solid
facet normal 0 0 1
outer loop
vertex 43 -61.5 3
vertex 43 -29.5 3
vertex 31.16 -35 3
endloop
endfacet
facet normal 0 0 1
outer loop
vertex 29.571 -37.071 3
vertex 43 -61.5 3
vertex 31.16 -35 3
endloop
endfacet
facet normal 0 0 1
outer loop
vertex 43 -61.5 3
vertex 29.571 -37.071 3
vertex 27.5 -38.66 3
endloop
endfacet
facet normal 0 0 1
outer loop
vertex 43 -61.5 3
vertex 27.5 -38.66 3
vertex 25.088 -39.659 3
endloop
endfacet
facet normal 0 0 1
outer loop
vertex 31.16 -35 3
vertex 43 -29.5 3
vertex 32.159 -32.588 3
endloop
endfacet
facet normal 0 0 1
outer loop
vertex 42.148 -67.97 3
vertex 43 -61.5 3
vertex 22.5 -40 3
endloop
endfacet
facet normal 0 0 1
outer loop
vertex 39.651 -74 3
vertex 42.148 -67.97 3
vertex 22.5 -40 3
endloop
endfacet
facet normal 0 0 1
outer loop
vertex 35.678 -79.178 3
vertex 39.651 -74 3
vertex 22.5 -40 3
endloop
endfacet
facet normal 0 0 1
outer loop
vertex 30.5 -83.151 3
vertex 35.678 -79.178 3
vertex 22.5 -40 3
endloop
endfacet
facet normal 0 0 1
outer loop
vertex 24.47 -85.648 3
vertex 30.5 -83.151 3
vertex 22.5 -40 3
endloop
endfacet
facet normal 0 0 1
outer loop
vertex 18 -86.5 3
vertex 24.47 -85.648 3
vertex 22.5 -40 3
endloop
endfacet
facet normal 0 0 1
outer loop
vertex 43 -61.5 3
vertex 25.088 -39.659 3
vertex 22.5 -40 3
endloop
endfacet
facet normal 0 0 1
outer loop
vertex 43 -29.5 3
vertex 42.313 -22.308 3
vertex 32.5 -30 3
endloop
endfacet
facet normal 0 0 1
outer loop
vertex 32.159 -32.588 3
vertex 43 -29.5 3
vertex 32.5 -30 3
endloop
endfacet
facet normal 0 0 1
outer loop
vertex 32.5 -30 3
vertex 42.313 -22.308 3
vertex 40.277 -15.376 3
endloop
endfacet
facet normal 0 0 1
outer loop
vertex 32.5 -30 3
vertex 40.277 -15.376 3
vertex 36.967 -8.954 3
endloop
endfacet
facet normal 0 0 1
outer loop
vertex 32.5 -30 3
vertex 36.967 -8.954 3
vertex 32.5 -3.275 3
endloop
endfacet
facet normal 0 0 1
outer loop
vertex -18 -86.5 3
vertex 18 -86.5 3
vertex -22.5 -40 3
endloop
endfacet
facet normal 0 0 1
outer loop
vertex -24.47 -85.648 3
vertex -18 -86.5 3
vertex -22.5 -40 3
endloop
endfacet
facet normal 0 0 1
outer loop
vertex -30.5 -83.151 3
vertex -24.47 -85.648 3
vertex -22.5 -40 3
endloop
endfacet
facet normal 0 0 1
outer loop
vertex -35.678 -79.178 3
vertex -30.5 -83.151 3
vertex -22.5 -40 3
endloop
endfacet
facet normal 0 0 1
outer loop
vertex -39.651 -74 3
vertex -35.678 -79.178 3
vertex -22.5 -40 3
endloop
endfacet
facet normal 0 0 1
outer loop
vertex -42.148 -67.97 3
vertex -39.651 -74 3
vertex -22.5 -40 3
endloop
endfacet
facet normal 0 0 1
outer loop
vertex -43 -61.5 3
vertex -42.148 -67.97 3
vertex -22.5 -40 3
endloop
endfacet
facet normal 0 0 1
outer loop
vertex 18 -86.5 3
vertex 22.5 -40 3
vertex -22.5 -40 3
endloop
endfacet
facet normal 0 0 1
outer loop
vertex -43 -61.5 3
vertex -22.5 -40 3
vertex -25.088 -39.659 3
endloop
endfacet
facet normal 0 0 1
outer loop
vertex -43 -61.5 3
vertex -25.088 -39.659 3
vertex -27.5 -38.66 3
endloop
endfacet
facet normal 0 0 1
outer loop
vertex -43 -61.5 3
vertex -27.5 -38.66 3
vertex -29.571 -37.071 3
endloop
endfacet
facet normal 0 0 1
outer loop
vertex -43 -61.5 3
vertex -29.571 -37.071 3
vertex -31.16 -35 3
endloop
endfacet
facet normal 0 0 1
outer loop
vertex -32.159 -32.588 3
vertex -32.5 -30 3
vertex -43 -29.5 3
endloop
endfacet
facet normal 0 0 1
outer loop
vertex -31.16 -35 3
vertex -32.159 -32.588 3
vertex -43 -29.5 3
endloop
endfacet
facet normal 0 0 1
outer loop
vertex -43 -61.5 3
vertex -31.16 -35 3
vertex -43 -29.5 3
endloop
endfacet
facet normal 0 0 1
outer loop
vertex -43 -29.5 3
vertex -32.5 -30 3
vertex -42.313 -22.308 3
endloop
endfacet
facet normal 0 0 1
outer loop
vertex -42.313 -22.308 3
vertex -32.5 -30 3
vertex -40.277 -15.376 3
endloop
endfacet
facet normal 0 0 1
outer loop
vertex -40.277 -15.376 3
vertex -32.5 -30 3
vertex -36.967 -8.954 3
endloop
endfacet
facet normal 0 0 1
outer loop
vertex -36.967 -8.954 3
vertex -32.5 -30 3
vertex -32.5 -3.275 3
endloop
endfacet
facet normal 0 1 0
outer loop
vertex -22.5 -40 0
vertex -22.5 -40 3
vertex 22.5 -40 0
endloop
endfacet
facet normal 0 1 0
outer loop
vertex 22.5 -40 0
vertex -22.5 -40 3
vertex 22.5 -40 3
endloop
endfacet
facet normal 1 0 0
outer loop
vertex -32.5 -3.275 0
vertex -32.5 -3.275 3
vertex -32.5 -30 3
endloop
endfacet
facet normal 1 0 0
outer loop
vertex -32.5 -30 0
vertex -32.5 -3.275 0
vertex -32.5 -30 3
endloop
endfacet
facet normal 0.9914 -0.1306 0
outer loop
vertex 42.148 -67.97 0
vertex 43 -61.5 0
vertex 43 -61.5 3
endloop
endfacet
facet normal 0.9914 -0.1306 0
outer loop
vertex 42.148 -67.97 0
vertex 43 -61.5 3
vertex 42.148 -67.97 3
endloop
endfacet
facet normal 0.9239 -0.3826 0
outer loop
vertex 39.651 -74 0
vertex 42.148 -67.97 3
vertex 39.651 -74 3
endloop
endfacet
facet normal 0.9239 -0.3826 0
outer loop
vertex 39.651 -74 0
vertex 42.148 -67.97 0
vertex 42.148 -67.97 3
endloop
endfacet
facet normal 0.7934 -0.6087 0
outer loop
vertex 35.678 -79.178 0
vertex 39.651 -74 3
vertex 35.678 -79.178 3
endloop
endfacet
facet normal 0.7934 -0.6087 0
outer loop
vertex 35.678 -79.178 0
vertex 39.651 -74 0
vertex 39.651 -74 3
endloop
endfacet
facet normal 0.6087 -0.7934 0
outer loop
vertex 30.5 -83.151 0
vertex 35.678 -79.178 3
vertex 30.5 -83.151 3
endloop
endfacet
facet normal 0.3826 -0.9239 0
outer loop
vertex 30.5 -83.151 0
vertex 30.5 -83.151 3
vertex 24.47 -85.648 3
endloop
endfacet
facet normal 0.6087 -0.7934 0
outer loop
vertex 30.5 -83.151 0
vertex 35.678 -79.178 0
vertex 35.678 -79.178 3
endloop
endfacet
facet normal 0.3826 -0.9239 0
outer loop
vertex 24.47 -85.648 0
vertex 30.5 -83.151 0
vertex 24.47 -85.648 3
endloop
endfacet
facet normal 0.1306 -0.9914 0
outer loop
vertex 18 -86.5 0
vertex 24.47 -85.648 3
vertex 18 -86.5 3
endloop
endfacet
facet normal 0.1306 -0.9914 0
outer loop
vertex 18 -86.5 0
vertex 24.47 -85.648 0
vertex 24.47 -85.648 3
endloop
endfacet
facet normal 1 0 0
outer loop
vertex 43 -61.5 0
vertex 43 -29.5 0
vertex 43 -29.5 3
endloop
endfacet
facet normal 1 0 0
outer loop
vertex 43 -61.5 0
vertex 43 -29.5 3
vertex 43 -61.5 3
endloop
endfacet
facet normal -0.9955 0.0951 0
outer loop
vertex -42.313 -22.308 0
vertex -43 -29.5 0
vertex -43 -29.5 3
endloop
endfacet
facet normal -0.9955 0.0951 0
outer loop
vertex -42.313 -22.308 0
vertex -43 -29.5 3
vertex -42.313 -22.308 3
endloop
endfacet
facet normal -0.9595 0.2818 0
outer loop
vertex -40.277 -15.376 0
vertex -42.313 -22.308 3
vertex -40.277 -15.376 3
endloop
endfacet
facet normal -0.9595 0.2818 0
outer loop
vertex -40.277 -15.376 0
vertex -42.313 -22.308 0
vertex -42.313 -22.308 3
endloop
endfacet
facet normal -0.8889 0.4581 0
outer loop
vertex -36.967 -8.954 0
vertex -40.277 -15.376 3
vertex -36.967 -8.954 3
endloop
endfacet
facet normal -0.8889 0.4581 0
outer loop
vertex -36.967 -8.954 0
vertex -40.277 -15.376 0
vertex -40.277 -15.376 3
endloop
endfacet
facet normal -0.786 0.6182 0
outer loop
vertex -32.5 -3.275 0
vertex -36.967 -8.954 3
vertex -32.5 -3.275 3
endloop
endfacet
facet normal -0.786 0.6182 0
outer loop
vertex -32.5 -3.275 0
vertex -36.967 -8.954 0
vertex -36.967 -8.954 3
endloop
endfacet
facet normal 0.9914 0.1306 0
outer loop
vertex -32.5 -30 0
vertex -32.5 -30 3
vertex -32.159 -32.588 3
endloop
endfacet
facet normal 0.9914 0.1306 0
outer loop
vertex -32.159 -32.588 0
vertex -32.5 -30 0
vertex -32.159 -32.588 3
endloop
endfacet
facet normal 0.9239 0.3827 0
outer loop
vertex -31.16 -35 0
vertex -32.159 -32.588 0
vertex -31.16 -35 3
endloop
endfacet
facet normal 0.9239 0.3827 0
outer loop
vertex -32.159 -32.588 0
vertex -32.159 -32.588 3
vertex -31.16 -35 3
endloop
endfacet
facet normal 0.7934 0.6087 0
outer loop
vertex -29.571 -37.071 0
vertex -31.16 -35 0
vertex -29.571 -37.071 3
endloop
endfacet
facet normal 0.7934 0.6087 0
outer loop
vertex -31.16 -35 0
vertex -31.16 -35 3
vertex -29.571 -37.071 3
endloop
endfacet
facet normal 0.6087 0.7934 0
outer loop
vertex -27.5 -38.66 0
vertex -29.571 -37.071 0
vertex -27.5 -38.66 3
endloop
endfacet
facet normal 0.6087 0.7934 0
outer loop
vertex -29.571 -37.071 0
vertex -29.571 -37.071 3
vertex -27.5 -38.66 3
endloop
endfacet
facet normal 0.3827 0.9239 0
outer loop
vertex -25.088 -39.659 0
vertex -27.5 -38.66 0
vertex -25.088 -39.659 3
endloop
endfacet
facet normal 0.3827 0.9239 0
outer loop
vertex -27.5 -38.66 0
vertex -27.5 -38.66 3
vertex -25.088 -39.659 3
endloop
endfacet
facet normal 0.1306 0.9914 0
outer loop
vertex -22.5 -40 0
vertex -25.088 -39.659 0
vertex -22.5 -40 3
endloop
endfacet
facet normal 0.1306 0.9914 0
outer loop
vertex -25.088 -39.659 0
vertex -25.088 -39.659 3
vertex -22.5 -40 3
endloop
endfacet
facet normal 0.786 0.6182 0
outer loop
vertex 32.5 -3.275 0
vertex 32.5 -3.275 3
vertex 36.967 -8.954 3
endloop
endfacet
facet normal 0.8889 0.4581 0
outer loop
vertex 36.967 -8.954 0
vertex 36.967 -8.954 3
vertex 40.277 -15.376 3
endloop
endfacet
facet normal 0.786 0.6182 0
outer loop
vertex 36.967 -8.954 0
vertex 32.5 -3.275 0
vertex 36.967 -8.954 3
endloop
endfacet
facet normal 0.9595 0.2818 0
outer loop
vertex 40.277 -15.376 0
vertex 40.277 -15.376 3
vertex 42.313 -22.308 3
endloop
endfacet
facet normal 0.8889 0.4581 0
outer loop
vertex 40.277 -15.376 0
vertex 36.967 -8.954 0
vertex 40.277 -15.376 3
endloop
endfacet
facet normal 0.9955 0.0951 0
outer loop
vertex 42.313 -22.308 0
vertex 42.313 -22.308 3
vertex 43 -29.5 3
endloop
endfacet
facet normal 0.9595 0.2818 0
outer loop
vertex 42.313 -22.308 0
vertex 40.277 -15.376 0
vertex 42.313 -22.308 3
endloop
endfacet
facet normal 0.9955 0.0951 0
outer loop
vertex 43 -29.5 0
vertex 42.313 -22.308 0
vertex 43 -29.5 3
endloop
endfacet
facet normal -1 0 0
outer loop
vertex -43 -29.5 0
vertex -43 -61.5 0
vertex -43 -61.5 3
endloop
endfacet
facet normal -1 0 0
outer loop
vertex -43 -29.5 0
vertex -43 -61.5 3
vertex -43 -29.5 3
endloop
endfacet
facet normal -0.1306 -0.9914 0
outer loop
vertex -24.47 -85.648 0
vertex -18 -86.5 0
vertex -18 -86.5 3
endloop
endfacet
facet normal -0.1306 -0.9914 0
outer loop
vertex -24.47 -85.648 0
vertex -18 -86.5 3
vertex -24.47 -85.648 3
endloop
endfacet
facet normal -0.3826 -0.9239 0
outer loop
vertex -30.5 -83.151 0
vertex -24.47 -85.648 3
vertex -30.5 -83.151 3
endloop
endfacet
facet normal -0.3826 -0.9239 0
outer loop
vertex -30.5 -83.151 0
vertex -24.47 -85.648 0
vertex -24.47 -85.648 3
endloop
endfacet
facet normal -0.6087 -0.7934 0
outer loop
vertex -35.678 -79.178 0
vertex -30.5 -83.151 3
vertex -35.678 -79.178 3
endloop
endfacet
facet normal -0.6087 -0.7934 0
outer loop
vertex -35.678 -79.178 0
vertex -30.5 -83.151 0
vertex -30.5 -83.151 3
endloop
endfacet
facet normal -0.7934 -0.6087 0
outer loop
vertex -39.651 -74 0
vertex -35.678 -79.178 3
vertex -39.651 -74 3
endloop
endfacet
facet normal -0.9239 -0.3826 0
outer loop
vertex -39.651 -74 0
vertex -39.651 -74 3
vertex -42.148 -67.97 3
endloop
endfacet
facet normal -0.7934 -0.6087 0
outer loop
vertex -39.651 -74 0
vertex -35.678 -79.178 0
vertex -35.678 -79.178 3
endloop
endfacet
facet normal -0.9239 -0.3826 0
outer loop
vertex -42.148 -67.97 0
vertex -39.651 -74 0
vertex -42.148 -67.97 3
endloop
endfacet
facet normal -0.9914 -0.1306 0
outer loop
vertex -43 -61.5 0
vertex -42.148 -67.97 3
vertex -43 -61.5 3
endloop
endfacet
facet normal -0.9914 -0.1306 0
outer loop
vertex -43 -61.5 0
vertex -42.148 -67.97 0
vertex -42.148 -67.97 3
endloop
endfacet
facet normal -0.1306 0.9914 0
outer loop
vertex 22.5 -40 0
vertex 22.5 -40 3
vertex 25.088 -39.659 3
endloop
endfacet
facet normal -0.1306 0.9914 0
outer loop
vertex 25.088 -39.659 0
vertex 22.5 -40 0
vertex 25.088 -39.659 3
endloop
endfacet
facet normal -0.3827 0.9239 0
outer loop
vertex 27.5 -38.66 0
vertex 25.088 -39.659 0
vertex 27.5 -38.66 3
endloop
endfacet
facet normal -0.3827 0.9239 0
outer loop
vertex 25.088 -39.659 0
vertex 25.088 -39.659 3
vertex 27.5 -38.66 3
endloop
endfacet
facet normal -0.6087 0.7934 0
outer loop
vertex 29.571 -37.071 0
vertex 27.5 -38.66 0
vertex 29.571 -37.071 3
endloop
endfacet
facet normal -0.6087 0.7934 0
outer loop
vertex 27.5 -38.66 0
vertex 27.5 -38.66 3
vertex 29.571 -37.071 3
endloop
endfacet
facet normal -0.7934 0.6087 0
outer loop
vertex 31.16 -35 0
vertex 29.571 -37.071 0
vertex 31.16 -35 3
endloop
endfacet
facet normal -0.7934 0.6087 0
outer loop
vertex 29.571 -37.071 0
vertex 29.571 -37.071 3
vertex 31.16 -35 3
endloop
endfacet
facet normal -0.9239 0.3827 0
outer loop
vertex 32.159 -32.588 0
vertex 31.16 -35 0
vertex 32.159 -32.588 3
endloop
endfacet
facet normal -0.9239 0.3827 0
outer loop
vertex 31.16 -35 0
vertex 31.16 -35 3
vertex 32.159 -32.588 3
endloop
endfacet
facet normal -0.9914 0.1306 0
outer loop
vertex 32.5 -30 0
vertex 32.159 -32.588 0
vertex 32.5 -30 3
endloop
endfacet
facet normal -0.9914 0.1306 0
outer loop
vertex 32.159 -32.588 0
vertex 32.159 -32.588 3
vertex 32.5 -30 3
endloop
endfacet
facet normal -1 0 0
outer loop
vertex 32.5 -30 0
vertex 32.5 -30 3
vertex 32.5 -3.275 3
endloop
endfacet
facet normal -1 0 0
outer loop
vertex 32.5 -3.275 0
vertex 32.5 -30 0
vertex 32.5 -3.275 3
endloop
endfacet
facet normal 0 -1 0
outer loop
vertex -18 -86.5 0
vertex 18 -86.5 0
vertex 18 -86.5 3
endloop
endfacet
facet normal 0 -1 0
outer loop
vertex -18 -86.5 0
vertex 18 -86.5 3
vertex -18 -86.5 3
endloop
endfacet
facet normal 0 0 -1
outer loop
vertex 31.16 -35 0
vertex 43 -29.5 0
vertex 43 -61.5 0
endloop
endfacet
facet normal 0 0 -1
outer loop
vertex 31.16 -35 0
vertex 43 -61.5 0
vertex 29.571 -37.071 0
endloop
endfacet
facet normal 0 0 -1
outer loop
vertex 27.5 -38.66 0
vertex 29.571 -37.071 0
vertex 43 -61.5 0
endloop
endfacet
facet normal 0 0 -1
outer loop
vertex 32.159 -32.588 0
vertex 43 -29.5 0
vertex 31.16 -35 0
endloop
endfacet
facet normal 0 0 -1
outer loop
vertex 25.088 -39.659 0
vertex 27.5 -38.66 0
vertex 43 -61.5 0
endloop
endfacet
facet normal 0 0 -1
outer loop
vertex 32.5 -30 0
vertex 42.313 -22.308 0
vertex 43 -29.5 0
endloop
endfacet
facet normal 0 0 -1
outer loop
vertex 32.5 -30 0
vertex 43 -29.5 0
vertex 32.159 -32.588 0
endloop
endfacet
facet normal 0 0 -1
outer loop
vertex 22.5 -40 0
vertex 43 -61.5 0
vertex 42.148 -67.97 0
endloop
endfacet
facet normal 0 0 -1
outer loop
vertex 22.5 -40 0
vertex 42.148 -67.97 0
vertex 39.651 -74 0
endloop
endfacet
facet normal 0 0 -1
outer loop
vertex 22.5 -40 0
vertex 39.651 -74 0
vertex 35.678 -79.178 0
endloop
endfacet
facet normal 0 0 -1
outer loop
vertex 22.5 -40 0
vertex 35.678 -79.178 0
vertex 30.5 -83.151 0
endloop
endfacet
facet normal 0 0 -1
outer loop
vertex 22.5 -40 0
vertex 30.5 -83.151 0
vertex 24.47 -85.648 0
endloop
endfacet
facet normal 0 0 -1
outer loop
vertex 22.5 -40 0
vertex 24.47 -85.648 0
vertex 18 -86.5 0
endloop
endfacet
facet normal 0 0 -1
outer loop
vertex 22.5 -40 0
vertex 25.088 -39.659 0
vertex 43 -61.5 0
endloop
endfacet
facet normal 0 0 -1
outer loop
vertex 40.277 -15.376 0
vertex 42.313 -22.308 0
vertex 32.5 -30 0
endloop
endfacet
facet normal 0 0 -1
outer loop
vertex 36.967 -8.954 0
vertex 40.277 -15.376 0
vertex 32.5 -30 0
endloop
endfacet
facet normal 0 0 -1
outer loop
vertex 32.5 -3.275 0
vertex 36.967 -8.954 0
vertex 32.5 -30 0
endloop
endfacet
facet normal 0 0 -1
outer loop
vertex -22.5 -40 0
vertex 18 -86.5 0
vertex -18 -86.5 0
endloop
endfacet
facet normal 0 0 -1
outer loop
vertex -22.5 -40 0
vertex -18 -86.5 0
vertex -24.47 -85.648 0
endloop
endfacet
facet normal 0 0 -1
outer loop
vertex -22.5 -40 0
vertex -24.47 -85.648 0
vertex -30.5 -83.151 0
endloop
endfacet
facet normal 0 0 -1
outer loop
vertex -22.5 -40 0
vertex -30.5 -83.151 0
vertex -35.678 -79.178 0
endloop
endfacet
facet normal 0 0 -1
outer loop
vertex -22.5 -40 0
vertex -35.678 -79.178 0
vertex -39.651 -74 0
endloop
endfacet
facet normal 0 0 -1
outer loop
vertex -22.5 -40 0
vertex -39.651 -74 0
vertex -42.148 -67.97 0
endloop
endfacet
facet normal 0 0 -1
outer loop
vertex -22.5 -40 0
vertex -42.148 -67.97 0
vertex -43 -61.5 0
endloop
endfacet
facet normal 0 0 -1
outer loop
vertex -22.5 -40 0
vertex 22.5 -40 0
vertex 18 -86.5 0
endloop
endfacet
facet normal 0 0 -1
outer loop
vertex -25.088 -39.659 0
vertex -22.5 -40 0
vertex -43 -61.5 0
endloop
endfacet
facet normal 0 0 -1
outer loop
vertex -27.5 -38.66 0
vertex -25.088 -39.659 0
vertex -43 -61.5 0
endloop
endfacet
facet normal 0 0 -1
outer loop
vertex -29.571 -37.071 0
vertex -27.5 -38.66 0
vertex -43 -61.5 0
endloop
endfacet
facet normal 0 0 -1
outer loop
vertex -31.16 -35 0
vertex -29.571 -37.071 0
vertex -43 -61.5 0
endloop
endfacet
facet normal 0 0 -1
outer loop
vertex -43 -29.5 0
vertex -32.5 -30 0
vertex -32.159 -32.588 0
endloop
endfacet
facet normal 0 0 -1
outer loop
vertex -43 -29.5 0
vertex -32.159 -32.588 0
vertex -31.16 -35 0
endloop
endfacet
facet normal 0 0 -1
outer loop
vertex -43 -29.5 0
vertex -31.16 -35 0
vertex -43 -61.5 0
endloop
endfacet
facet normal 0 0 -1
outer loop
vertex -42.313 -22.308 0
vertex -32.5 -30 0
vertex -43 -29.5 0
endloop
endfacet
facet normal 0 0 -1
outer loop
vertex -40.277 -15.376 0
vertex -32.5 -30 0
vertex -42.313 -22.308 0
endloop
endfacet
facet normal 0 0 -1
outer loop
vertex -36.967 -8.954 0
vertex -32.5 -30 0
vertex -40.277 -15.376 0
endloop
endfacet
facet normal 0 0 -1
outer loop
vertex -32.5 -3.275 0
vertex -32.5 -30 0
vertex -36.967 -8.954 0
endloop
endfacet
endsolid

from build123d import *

# Parameters (mm, degrees)
BOSS_EXTRUDE1_DEPTH = 3
CUT_EXTRUDE1_DEPTH  = 10


with BuildPart() as part:
    # Sketch1 → Boss-Extrude1 (new body)
    with BuildSketch(Plane.XY):
        with BuildLine():
            Line((-5, 8.5), (5, 8.5))
            ThreePointArc((5, 8.5), (31.870057685, -2.629942315), (43, -29.5))
            Line((43, -29.5), (43, -61.5))
            ThreePointArc((43, -61.5), (35.67766953, -79.17766953), (18, -86.5))
            Line((18, -86.5), (0.5, -86.5))
            Line((0.5, -86.5), (-0.5, -86.5))
            Line((-0.5, -86.5), (-18, -86.5))
            ThreePointArc((-18, -86.5), (-35.67766953, -79.17766953), (-43, -61.5))
            Line((-43, -61.5), (-43, -29.5))
            ThreePointArc((-43, -29.5), (-31.870057685, -2.629942315), (-5, 8.5))
        make_face()
    extrude(amount=BOSS_EXTRUDE1_DEPTH)

    # Sketch2 → Cut-Extrude1 (cut)
    with BuildSketch(Plane.XY.offset(3)):
        with BuildLine():
            Line((-22.5, -40), (22.5, -40))
            ThreePointArc((22.5, -40), (29.571067812, -37.071067812), (32.5, -30))
            Line((32.5, -30), (32.5, 20))
            ThreePointArc((32.5, 20), (29.571067812, 27.071067812), (22.5, 30))
            Line((22.5, 30), (-22.5, 30))
            ThreePointArc((-22.5, 30), (-29.571067812, 27.071067812), (-32.5, 20))
            Line((-32.5, 20), (-32.5, -30))
            ThreePointArc((-32.5, -30), (-29.571067812, -37.071067812), (-22.5, -40))
        make_face()
    extrude(amount=-CUT_EXTRUDE1_DEPTH, mode=Mode.SUBTRACT)


solid = part.part
